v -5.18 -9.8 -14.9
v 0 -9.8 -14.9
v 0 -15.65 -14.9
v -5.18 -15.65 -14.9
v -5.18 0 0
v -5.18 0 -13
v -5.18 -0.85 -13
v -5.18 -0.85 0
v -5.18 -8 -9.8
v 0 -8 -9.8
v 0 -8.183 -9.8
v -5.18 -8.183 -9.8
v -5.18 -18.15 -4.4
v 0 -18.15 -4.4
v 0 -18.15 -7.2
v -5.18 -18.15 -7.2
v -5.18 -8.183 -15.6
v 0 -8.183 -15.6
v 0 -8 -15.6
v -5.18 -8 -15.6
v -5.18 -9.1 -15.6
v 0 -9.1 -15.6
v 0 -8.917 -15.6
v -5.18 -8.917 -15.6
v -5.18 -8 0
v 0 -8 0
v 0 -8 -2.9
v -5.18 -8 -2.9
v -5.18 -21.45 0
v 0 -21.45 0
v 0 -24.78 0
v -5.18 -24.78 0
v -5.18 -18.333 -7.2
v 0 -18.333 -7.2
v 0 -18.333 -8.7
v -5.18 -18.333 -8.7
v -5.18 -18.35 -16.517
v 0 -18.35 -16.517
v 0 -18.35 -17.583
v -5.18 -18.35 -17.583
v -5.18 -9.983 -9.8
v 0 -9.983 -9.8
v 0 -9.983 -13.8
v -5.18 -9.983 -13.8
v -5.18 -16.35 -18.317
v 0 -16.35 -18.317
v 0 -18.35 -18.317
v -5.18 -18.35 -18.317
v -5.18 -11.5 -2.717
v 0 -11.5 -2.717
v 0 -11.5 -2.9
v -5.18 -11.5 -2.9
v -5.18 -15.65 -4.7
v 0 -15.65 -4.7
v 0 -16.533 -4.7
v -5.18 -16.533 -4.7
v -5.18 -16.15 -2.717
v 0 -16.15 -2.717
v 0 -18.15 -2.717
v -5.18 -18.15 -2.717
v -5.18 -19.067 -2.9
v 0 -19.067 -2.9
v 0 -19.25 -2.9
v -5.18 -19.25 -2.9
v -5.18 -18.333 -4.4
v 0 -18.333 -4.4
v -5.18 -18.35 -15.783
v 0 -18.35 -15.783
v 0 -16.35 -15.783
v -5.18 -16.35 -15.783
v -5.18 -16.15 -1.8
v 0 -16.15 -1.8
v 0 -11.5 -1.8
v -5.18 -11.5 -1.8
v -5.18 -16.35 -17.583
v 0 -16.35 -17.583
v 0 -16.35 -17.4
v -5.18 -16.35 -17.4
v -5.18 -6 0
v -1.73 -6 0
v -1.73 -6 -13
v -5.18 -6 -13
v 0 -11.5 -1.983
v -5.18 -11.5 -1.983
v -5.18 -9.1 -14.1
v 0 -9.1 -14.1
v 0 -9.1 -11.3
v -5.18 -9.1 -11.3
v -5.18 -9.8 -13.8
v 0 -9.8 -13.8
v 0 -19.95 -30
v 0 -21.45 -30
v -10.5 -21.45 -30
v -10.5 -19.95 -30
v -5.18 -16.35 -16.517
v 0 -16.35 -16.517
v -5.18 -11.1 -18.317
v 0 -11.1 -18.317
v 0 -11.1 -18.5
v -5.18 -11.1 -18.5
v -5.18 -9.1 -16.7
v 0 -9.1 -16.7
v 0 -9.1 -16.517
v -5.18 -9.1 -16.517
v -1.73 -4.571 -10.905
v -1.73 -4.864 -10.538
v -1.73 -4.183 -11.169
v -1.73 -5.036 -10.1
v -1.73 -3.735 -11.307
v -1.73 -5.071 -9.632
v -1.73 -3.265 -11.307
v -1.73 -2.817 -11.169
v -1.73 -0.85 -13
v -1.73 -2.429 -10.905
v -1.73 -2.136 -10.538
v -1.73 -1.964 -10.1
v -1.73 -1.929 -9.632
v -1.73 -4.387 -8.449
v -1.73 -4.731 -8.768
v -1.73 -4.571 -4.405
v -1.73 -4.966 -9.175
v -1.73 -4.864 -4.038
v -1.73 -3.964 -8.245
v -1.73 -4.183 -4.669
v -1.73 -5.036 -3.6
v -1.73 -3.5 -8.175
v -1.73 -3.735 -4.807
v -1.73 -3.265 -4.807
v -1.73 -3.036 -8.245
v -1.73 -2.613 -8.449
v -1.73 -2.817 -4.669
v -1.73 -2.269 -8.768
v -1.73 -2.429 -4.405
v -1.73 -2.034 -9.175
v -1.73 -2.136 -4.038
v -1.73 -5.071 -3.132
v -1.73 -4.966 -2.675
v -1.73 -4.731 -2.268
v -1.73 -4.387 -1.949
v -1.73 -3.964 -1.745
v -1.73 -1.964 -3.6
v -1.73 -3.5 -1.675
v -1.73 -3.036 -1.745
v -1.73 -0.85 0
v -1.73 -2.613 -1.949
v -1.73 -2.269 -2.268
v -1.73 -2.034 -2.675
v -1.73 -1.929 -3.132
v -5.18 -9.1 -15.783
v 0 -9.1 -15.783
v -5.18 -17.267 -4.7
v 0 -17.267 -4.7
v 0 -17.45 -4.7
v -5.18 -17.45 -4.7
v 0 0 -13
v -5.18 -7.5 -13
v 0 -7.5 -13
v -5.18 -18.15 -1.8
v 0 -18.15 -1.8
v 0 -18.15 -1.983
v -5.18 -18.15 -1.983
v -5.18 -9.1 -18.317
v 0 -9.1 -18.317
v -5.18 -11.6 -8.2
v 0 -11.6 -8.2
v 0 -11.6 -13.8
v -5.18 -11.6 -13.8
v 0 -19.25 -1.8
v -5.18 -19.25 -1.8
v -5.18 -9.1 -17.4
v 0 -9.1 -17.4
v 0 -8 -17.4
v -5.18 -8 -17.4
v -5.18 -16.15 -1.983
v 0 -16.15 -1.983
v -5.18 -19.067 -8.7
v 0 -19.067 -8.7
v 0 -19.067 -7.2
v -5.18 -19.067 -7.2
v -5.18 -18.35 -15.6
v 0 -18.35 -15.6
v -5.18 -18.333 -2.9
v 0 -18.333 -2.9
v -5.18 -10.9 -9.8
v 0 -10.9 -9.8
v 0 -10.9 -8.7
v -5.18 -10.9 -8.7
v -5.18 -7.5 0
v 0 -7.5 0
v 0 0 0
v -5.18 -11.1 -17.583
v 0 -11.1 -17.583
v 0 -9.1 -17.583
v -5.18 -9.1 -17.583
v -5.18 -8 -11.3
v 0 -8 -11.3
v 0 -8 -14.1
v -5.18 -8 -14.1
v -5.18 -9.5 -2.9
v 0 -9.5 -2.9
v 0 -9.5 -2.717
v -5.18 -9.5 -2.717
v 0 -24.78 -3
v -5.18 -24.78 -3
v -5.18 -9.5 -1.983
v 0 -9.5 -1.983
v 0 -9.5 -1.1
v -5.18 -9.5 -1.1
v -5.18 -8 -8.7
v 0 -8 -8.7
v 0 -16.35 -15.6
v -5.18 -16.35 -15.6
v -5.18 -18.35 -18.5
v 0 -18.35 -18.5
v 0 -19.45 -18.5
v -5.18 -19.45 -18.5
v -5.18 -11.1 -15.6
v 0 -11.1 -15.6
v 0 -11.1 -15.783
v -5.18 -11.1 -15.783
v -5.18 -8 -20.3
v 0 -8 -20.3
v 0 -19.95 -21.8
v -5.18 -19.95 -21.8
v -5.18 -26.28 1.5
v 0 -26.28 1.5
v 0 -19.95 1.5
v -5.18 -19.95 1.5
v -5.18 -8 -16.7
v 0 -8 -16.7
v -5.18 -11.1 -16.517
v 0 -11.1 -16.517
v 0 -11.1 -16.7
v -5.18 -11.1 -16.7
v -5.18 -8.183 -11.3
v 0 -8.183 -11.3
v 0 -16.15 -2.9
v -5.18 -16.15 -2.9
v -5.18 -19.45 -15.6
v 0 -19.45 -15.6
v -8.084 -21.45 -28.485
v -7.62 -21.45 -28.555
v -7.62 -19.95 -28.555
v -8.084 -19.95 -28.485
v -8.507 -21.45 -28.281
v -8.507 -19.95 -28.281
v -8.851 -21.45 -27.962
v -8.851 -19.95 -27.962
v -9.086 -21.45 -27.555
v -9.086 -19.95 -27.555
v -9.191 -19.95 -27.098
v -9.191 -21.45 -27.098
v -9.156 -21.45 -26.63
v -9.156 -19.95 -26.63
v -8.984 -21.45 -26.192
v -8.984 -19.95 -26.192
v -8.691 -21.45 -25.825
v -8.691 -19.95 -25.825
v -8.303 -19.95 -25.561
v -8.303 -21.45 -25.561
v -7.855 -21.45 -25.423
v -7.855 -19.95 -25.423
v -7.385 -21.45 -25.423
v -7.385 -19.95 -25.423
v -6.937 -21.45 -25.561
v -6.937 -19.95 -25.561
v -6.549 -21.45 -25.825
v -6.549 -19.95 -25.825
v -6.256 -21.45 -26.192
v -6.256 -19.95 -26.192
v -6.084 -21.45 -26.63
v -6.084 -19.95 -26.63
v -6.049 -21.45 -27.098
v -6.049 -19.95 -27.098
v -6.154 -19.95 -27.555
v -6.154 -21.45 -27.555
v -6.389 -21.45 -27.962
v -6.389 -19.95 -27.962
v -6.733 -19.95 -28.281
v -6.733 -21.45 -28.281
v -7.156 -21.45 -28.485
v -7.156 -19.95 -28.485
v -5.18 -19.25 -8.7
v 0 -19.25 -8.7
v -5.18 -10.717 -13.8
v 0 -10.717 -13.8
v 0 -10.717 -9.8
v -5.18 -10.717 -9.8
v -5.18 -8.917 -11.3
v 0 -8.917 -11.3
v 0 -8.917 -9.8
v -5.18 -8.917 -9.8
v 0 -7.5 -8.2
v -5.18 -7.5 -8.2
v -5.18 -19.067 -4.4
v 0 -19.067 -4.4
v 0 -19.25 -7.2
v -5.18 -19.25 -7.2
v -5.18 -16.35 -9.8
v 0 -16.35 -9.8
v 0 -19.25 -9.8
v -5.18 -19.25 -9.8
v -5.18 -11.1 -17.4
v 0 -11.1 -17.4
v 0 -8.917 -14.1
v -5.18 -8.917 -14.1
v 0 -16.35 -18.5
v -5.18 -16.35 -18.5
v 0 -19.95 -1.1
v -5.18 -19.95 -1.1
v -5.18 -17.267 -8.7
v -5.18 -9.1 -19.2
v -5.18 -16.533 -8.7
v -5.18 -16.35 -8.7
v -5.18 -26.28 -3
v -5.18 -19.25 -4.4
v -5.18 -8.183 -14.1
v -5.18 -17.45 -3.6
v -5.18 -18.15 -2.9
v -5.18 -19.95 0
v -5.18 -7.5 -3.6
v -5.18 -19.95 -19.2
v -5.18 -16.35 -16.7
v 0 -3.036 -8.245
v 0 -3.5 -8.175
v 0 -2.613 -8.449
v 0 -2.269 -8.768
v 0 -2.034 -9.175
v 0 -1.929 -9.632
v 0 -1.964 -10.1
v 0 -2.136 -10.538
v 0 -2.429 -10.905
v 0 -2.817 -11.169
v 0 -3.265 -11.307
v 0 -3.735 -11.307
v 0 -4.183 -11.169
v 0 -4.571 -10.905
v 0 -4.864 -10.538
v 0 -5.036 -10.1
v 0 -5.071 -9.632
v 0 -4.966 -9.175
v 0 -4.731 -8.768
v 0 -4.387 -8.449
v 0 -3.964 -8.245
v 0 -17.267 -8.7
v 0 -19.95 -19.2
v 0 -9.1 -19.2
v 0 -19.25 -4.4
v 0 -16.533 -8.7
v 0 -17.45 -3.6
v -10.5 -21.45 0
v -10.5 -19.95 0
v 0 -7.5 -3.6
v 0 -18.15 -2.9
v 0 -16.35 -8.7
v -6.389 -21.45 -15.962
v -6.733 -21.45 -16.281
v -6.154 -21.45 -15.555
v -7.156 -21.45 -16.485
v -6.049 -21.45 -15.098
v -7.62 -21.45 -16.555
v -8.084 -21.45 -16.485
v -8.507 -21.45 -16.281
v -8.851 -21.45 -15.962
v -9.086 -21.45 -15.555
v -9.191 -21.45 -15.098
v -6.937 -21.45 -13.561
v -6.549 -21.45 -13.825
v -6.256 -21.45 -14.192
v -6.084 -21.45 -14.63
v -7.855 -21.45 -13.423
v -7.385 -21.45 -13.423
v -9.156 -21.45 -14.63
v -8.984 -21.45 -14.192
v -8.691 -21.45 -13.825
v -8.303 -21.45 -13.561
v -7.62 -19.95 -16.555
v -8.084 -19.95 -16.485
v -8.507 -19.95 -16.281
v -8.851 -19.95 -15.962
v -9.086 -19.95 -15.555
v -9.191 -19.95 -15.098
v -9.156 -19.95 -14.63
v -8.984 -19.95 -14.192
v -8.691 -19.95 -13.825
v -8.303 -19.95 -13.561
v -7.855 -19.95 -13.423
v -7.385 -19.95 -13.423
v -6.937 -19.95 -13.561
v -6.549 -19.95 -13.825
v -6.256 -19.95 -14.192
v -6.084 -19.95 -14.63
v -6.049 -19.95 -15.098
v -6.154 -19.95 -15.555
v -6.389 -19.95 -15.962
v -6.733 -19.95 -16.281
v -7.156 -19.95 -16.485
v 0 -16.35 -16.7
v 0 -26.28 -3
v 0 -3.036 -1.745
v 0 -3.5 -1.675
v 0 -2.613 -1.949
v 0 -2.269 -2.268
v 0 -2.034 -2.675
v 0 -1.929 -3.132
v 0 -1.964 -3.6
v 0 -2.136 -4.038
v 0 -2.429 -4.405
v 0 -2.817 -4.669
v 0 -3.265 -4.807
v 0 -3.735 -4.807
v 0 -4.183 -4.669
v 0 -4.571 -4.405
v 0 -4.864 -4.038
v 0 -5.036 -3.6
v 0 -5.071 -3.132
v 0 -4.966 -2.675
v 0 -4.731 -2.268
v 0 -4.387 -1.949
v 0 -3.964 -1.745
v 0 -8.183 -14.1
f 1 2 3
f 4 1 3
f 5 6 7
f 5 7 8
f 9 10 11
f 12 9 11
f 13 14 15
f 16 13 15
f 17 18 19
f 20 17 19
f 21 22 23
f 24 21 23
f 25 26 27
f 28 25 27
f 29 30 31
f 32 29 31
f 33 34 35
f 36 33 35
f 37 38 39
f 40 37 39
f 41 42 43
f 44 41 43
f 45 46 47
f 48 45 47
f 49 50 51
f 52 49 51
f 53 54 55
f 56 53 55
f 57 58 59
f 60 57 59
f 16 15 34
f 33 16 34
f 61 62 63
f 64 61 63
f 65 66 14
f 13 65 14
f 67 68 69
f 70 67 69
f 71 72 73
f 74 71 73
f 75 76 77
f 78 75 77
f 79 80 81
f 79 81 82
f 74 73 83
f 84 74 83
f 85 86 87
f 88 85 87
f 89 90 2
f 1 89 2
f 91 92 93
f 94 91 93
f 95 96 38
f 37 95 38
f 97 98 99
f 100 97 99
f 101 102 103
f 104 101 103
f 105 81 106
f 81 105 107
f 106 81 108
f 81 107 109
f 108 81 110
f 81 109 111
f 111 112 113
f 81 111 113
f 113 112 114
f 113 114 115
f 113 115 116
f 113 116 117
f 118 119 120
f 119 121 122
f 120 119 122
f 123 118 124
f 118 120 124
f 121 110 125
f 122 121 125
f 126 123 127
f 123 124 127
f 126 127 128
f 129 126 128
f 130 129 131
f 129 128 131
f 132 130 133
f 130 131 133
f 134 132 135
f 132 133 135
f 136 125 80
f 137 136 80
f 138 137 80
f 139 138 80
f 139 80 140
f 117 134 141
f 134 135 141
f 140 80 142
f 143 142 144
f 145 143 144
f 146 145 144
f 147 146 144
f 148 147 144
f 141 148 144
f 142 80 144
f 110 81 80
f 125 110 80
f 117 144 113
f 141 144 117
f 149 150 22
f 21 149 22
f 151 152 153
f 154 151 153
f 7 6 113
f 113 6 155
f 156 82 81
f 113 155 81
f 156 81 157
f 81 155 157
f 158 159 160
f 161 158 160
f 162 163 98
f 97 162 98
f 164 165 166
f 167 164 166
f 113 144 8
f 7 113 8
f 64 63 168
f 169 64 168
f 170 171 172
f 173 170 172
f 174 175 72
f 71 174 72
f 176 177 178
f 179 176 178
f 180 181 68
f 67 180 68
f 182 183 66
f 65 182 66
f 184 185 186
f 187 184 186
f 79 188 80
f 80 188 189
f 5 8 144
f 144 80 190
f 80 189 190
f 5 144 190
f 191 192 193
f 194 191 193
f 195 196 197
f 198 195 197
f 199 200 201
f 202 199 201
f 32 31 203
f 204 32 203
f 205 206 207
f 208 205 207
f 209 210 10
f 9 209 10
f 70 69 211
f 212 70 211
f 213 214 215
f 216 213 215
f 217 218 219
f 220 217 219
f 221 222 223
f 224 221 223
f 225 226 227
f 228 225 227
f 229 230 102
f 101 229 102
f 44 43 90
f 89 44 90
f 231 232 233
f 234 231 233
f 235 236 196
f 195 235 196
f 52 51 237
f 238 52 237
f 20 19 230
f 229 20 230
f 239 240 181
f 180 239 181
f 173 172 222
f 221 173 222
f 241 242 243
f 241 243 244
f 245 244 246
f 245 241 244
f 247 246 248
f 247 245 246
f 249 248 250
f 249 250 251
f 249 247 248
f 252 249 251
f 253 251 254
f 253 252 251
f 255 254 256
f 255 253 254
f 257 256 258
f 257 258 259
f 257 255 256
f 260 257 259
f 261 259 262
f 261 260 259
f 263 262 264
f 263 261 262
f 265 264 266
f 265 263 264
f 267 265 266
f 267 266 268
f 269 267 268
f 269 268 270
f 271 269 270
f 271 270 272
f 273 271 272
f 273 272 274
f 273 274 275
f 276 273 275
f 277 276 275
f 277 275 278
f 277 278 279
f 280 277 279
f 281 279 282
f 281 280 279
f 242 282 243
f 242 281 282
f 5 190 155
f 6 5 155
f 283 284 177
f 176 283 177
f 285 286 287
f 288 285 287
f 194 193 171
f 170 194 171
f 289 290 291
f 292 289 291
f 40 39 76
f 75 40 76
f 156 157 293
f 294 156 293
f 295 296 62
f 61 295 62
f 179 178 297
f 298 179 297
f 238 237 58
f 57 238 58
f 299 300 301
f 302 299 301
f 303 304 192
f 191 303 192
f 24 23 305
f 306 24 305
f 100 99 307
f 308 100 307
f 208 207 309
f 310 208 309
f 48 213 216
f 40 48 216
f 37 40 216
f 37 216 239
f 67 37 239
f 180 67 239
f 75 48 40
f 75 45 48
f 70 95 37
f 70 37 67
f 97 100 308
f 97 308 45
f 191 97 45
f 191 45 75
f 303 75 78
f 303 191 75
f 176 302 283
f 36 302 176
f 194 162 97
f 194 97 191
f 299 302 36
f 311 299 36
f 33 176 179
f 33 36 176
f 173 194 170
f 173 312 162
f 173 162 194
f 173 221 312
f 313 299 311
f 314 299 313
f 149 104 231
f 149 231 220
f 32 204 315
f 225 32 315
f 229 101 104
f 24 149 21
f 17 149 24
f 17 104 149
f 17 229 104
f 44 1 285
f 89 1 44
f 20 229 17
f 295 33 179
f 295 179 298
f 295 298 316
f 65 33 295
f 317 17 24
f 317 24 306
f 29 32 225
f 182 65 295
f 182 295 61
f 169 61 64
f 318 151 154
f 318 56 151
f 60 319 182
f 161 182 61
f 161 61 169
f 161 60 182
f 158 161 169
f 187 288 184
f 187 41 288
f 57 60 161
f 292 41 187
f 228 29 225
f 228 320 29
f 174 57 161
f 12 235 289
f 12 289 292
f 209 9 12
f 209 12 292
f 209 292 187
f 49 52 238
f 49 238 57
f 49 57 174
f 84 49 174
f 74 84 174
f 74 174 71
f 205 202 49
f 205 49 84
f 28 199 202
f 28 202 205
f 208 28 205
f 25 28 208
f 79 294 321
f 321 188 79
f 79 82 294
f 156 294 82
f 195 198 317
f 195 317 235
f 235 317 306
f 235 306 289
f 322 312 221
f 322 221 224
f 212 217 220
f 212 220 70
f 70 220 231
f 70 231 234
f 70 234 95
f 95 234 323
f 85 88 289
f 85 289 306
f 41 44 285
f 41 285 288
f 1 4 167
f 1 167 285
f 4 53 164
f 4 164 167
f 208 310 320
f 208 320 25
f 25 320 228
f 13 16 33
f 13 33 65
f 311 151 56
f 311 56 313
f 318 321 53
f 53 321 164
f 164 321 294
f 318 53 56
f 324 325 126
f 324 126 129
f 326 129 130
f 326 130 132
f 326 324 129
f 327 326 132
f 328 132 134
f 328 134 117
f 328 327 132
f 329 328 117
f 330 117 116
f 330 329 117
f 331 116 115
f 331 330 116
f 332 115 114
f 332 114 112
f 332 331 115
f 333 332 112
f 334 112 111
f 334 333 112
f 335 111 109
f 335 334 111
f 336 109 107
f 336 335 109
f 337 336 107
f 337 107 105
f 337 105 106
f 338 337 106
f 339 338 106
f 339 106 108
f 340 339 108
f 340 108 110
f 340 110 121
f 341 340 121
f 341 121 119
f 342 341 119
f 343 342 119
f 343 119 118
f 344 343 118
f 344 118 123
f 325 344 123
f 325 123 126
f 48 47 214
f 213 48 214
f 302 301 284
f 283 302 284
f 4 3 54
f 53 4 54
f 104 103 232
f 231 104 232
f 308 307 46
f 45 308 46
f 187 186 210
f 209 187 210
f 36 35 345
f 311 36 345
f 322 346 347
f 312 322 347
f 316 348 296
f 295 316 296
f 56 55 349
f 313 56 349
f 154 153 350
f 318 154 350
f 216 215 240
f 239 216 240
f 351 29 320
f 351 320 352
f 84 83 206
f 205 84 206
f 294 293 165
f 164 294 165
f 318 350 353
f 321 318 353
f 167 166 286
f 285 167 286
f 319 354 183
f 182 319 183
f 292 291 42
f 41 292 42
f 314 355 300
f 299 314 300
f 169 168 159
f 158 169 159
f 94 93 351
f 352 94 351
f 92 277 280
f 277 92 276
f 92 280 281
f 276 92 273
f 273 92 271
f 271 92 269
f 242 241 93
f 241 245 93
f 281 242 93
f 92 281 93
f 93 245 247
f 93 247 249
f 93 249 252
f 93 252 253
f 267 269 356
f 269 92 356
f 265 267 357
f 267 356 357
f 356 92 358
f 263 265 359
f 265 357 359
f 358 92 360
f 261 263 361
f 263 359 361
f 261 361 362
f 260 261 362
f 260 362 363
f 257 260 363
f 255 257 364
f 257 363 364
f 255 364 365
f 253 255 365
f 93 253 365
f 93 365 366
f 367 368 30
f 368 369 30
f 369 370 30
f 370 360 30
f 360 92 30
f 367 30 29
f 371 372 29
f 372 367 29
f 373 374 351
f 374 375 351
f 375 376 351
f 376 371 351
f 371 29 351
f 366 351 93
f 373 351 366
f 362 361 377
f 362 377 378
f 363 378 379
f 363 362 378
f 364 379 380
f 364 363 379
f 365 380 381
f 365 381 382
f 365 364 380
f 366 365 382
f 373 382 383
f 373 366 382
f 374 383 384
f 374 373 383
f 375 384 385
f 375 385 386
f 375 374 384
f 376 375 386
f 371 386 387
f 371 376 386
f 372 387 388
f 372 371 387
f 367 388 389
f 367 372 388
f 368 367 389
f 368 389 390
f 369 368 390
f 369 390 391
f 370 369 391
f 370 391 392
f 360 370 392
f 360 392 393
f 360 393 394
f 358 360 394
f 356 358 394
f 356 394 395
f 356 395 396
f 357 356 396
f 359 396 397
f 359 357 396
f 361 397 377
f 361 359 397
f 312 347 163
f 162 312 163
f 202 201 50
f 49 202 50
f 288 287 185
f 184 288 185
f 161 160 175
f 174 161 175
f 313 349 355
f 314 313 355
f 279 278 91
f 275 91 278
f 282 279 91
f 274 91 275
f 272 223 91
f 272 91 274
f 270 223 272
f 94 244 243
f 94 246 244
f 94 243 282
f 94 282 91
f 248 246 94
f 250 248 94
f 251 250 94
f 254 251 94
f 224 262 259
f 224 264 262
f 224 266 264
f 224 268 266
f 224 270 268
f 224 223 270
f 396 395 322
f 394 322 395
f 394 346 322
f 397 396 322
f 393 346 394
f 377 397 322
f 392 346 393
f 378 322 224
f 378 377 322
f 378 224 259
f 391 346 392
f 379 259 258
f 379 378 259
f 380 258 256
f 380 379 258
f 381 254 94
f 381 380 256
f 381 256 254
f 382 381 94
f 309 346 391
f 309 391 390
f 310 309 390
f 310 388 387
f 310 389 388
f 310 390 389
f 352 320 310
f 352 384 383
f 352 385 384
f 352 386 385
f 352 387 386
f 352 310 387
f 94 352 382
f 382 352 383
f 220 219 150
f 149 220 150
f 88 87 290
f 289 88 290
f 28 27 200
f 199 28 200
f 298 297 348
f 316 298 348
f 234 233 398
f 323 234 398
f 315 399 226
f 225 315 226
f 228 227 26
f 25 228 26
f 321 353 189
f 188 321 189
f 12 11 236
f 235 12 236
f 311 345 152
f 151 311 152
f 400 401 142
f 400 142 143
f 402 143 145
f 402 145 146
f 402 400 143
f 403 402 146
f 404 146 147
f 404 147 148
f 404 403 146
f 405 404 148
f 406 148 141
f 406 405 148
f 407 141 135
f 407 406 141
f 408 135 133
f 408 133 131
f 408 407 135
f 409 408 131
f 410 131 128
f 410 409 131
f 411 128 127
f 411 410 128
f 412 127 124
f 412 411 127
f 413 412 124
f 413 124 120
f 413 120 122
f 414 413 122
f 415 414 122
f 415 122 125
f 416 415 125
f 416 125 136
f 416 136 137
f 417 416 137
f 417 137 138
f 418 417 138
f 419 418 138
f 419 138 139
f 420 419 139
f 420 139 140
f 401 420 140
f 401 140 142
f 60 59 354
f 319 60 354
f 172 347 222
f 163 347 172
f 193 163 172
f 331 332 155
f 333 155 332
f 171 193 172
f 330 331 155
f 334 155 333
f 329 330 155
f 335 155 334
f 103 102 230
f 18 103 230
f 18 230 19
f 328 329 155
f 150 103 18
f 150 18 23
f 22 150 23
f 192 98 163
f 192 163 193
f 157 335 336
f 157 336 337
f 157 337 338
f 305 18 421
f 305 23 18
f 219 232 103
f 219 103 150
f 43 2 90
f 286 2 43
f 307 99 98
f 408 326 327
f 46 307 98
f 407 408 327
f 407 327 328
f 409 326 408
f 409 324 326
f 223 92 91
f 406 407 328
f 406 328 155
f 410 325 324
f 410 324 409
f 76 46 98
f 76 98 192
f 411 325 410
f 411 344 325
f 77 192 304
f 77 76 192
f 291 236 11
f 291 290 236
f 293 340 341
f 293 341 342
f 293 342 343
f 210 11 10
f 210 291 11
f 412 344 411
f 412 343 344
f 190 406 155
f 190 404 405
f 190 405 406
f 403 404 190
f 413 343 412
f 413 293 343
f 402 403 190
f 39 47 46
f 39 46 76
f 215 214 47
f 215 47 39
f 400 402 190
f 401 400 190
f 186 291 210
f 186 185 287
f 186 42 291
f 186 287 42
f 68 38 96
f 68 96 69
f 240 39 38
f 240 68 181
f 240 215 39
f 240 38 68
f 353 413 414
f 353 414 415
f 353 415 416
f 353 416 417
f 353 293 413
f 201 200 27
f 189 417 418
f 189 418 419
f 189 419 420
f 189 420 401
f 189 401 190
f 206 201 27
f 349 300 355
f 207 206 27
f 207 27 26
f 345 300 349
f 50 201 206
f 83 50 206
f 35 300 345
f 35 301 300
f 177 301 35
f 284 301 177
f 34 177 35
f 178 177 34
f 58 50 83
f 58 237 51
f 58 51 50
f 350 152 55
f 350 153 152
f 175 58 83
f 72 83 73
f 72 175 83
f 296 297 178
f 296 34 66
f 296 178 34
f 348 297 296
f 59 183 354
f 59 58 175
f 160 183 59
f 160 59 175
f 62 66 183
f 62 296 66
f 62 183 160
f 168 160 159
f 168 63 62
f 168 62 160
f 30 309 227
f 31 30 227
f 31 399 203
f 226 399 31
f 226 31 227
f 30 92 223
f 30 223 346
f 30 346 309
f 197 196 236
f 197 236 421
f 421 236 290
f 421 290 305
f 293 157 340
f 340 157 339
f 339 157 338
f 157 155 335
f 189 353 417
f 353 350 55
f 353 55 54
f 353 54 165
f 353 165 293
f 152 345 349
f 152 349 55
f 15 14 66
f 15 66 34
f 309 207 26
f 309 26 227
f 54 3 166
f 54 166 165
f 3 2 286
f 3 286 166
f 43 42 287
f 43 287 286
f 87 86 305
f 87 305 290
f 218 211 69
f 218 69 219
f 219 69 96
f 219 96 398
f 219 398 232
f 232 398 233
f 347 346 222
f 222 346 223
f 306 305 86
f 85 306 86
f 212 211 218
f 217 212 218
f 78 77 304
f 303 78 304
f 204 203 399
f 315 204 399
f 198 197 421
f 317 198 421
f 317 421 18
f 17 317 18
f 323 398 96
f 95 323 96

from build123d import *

# Parameters (mm, degrees)
BOSS_EXTRUDE1_DEPTH = 5.18
CUT_EXTRUDE1_REACH  = 36.536
SKETCH2_W           = 3.45
SKETCH2_H           = 5.15
SKETCH3_W           = 10.5
SKETCH3_H           = 30
SKETCH3_R           = 1.575
BOSS_EXTRUDE2_DEPTH = 1.5
CUT_EXTRUDE3_REACH  = 43.242
SKETCH7_R           = 1.575


with BuildPart() as part:
    # Sketch1 → Boss-Extrude1 (new body)
    with BuildSketch(Plane(origin=(0, 0, 0), x_dir=(0, 0, -1), z_dir=(1, 0, 0))):
        Polygon((0, 0), (13, 0), (13, -7.5), (8.2, -7.5), (8.2, -11.6), (13.8, -11.6), (13.8, -10.716666667), (9.8, -10.716666667), (9.8, -10.9), (8.7, -10.9), (8.7, -8), (9.8, -8), (9.8, -8.183333333), (11.3, -8.183333333), (11.3, -8), (14.1, -8), (14.1, -8.183333333), (15.6, -8.183333333), (15.6, -8), (16.7, -8), (16.7, -9.1), (16.516666667, -9.1), (16.516666667, -11.1), (16.7, -11.1), (16.7, -16.35), (16.516666667, -16.35), (16.516666667, -18.35), (17.583333333, -18.35), (17.583333333, -16.35), (17.4, -16.35), (17.4, -11.1), (17.583333333, -11.1), (17.583333333, -9.1), (17.4, -9.1), (17.4, -8), (20.3, -8), (21.8, -19.95), (21.8, -21.45), (0, -21.45), (0, -24.78), (3, -24.78), (3, -26.28), (-1.5, -26.28), (-1.5, -19.95), (0, -8), (2.9, -8), (2.9, -9.5), (2.716666667, -9.5), (2.716666667, -11.5), (2.9, -11.5), (2.9, -16.15), (2.716666667, -16.15), (2.716666667, -18.15), (2.9, -18.15), (2.9, -18.333333333), (4.4, -18.333333333), (4.4, -18.15), (7.2, -18.15), (7.2, -18.333333333), (8.7, -18.333333333), (8.7, -17.266666667), (4.7, -17.266666667), (4.7, -17.45), (3.6, -17.45), (3.6, -7.5), (0, -7.5), align=None)
        Polygon((14.9, -9.8), (14.9, -15.65), (4.7, -15.65), (4.7, -16.533333333), (8.7, -16.533333333), (8.7, -16.35), (9.8, -16.35), (9.8, -19.25), (8.7, -19.25), (8.7, -19.066666667), (7.2, -19.066666667), (7.2, -19.25), (4.4, -19.25), (4.4, -19.066666667), (2.9, -19.066666667), (2.9, -19.25), (1.8, -19.25), (1.8, -18.15), (1.983333333, -18.15), (1.983333333, -16.15), (1.8, -16.15), (1.8, -11.5), (1.983333333, -11.5), (1.983333333, -9.5), (1.1, -9.5), (1.1, -19.95), (19.2, -19.95), (19.2, -9.1), (18.316666667, -9.1), (18.316666667, -11.1), (18.5, -11.1), (18.5, -16.35), (18.316666667, -16.35), (18.316666667, -18.35), (18.5, -18.35), (18.5, -19.45), (15.6, -19.45), (15.6, -18.35), (15.783333333, -18.35), (15.783333333, -16.35), (15.6, -16.35), (15.6, -11.1), (15.783333333, -11.1), (15.783333333, -9.1), (15.6, -9.1), (15.6, -8.916666667), (14.1, -8.916666667), (14.1, -9.1), (11.3, -9.1), (11.3, -8.916666667), (9.8, -8.916666667), (9.8, -9.983333333), (13.8, -9.983333333), (13.8, -9.8), align=None, mode=Mode.SUBTRACT)
    extrude(amount=BOSS_EXTRUDE1_DEPTH)

    # Sketch2 → Cut-Extrude1 (cut, up to next)
    with BuildSketch(Plane.XY, mode=Mode.PRIVATE) as cut_extrude1_sk1:
        with Locations((3.455, -3.425)):
            Rectangle(SKETCH2_W, SKETCH2_H)
    cut_extrude1_tool1 = extrude(cut_extrude1_sk1.sketch, amount=-CUT_EXTRUDE1_REACH, mode=Mode.PRIVATE) & part.part
    add(cut_extrude1_tool1.solids().sort_by_distance((3.455, -3.425, 0))[0], mode=Mode.SUBTRACT)

    # Sketch3 → Boss-Extrude2 (add)
    with BuildSketch(Plane.XZ.offset(21.45)):
        with Locations((5.25, -15)):
            Rectangle(SKETCH3_W, SKETCH3_H)
        with Locations(Location((7.62, -14.98, 0), (0, 0, 270))):
            Circle(SKETCH3_R, mode=Mode.SUBTRACT)
        with Locations(Location((7.62, -26.98, 0), (0, 0, 270))):
            Circle(SKETCH3_R, mode=Mode.SUBTRACT)
    extrude(amount=-BOSS_EXTRUDE2_DEPTH)

    # Sketch7 → Cut-Extrude3 (cut, up to next)
    with BuildSketch(Plane.ZY, mode=Mode.PRIVATE) as cut_extrude3_sk1:
        with Locations((-3.25, -3.5)):
            Circle(SKETCH7_R)
    cut_extrude3_tool1 = extrude(cut_extrude3_sk1.sketch, amount=-CUT_EXTRUDE3_REACH, mode=Mode.PRIVATE) & part.part
    # Sketch7 → Cut-Extrude3 (cut, up to next)
    with BuildSketch(Plane.ZY, mode=Mode.PRIVATE) as cut_extrude3_sk2:
        with Locations((-9.75, -3.5)):
            Circle(SKETCH7_R)
    cut_extrude3_tool2 = extrude(cut_extrude3_sk2.sketch, amount=-CUT_EXTRUDE3_REACH, mode=Mode.PRIVATE) & part.part
    add(cut_extrude3_tool1.solids().sort_by_distance((0, -3.5, -3.25))[0], mode=Mode.SUBTRACT)
    add(cut_extrude3_tool2.solids().sort_by_distance((0, -3.5, -9.75))[0], mode=Mode.SUBTRACT)


with BuildPart() as body_2:
    # Mirror3: mirrored copy
    add(part.part.mirror(Plane(origin=(0, 0, 0), x_dir=(0, 0, 1), z_dir=(1, 0, 0))))


solid = body_2.part
